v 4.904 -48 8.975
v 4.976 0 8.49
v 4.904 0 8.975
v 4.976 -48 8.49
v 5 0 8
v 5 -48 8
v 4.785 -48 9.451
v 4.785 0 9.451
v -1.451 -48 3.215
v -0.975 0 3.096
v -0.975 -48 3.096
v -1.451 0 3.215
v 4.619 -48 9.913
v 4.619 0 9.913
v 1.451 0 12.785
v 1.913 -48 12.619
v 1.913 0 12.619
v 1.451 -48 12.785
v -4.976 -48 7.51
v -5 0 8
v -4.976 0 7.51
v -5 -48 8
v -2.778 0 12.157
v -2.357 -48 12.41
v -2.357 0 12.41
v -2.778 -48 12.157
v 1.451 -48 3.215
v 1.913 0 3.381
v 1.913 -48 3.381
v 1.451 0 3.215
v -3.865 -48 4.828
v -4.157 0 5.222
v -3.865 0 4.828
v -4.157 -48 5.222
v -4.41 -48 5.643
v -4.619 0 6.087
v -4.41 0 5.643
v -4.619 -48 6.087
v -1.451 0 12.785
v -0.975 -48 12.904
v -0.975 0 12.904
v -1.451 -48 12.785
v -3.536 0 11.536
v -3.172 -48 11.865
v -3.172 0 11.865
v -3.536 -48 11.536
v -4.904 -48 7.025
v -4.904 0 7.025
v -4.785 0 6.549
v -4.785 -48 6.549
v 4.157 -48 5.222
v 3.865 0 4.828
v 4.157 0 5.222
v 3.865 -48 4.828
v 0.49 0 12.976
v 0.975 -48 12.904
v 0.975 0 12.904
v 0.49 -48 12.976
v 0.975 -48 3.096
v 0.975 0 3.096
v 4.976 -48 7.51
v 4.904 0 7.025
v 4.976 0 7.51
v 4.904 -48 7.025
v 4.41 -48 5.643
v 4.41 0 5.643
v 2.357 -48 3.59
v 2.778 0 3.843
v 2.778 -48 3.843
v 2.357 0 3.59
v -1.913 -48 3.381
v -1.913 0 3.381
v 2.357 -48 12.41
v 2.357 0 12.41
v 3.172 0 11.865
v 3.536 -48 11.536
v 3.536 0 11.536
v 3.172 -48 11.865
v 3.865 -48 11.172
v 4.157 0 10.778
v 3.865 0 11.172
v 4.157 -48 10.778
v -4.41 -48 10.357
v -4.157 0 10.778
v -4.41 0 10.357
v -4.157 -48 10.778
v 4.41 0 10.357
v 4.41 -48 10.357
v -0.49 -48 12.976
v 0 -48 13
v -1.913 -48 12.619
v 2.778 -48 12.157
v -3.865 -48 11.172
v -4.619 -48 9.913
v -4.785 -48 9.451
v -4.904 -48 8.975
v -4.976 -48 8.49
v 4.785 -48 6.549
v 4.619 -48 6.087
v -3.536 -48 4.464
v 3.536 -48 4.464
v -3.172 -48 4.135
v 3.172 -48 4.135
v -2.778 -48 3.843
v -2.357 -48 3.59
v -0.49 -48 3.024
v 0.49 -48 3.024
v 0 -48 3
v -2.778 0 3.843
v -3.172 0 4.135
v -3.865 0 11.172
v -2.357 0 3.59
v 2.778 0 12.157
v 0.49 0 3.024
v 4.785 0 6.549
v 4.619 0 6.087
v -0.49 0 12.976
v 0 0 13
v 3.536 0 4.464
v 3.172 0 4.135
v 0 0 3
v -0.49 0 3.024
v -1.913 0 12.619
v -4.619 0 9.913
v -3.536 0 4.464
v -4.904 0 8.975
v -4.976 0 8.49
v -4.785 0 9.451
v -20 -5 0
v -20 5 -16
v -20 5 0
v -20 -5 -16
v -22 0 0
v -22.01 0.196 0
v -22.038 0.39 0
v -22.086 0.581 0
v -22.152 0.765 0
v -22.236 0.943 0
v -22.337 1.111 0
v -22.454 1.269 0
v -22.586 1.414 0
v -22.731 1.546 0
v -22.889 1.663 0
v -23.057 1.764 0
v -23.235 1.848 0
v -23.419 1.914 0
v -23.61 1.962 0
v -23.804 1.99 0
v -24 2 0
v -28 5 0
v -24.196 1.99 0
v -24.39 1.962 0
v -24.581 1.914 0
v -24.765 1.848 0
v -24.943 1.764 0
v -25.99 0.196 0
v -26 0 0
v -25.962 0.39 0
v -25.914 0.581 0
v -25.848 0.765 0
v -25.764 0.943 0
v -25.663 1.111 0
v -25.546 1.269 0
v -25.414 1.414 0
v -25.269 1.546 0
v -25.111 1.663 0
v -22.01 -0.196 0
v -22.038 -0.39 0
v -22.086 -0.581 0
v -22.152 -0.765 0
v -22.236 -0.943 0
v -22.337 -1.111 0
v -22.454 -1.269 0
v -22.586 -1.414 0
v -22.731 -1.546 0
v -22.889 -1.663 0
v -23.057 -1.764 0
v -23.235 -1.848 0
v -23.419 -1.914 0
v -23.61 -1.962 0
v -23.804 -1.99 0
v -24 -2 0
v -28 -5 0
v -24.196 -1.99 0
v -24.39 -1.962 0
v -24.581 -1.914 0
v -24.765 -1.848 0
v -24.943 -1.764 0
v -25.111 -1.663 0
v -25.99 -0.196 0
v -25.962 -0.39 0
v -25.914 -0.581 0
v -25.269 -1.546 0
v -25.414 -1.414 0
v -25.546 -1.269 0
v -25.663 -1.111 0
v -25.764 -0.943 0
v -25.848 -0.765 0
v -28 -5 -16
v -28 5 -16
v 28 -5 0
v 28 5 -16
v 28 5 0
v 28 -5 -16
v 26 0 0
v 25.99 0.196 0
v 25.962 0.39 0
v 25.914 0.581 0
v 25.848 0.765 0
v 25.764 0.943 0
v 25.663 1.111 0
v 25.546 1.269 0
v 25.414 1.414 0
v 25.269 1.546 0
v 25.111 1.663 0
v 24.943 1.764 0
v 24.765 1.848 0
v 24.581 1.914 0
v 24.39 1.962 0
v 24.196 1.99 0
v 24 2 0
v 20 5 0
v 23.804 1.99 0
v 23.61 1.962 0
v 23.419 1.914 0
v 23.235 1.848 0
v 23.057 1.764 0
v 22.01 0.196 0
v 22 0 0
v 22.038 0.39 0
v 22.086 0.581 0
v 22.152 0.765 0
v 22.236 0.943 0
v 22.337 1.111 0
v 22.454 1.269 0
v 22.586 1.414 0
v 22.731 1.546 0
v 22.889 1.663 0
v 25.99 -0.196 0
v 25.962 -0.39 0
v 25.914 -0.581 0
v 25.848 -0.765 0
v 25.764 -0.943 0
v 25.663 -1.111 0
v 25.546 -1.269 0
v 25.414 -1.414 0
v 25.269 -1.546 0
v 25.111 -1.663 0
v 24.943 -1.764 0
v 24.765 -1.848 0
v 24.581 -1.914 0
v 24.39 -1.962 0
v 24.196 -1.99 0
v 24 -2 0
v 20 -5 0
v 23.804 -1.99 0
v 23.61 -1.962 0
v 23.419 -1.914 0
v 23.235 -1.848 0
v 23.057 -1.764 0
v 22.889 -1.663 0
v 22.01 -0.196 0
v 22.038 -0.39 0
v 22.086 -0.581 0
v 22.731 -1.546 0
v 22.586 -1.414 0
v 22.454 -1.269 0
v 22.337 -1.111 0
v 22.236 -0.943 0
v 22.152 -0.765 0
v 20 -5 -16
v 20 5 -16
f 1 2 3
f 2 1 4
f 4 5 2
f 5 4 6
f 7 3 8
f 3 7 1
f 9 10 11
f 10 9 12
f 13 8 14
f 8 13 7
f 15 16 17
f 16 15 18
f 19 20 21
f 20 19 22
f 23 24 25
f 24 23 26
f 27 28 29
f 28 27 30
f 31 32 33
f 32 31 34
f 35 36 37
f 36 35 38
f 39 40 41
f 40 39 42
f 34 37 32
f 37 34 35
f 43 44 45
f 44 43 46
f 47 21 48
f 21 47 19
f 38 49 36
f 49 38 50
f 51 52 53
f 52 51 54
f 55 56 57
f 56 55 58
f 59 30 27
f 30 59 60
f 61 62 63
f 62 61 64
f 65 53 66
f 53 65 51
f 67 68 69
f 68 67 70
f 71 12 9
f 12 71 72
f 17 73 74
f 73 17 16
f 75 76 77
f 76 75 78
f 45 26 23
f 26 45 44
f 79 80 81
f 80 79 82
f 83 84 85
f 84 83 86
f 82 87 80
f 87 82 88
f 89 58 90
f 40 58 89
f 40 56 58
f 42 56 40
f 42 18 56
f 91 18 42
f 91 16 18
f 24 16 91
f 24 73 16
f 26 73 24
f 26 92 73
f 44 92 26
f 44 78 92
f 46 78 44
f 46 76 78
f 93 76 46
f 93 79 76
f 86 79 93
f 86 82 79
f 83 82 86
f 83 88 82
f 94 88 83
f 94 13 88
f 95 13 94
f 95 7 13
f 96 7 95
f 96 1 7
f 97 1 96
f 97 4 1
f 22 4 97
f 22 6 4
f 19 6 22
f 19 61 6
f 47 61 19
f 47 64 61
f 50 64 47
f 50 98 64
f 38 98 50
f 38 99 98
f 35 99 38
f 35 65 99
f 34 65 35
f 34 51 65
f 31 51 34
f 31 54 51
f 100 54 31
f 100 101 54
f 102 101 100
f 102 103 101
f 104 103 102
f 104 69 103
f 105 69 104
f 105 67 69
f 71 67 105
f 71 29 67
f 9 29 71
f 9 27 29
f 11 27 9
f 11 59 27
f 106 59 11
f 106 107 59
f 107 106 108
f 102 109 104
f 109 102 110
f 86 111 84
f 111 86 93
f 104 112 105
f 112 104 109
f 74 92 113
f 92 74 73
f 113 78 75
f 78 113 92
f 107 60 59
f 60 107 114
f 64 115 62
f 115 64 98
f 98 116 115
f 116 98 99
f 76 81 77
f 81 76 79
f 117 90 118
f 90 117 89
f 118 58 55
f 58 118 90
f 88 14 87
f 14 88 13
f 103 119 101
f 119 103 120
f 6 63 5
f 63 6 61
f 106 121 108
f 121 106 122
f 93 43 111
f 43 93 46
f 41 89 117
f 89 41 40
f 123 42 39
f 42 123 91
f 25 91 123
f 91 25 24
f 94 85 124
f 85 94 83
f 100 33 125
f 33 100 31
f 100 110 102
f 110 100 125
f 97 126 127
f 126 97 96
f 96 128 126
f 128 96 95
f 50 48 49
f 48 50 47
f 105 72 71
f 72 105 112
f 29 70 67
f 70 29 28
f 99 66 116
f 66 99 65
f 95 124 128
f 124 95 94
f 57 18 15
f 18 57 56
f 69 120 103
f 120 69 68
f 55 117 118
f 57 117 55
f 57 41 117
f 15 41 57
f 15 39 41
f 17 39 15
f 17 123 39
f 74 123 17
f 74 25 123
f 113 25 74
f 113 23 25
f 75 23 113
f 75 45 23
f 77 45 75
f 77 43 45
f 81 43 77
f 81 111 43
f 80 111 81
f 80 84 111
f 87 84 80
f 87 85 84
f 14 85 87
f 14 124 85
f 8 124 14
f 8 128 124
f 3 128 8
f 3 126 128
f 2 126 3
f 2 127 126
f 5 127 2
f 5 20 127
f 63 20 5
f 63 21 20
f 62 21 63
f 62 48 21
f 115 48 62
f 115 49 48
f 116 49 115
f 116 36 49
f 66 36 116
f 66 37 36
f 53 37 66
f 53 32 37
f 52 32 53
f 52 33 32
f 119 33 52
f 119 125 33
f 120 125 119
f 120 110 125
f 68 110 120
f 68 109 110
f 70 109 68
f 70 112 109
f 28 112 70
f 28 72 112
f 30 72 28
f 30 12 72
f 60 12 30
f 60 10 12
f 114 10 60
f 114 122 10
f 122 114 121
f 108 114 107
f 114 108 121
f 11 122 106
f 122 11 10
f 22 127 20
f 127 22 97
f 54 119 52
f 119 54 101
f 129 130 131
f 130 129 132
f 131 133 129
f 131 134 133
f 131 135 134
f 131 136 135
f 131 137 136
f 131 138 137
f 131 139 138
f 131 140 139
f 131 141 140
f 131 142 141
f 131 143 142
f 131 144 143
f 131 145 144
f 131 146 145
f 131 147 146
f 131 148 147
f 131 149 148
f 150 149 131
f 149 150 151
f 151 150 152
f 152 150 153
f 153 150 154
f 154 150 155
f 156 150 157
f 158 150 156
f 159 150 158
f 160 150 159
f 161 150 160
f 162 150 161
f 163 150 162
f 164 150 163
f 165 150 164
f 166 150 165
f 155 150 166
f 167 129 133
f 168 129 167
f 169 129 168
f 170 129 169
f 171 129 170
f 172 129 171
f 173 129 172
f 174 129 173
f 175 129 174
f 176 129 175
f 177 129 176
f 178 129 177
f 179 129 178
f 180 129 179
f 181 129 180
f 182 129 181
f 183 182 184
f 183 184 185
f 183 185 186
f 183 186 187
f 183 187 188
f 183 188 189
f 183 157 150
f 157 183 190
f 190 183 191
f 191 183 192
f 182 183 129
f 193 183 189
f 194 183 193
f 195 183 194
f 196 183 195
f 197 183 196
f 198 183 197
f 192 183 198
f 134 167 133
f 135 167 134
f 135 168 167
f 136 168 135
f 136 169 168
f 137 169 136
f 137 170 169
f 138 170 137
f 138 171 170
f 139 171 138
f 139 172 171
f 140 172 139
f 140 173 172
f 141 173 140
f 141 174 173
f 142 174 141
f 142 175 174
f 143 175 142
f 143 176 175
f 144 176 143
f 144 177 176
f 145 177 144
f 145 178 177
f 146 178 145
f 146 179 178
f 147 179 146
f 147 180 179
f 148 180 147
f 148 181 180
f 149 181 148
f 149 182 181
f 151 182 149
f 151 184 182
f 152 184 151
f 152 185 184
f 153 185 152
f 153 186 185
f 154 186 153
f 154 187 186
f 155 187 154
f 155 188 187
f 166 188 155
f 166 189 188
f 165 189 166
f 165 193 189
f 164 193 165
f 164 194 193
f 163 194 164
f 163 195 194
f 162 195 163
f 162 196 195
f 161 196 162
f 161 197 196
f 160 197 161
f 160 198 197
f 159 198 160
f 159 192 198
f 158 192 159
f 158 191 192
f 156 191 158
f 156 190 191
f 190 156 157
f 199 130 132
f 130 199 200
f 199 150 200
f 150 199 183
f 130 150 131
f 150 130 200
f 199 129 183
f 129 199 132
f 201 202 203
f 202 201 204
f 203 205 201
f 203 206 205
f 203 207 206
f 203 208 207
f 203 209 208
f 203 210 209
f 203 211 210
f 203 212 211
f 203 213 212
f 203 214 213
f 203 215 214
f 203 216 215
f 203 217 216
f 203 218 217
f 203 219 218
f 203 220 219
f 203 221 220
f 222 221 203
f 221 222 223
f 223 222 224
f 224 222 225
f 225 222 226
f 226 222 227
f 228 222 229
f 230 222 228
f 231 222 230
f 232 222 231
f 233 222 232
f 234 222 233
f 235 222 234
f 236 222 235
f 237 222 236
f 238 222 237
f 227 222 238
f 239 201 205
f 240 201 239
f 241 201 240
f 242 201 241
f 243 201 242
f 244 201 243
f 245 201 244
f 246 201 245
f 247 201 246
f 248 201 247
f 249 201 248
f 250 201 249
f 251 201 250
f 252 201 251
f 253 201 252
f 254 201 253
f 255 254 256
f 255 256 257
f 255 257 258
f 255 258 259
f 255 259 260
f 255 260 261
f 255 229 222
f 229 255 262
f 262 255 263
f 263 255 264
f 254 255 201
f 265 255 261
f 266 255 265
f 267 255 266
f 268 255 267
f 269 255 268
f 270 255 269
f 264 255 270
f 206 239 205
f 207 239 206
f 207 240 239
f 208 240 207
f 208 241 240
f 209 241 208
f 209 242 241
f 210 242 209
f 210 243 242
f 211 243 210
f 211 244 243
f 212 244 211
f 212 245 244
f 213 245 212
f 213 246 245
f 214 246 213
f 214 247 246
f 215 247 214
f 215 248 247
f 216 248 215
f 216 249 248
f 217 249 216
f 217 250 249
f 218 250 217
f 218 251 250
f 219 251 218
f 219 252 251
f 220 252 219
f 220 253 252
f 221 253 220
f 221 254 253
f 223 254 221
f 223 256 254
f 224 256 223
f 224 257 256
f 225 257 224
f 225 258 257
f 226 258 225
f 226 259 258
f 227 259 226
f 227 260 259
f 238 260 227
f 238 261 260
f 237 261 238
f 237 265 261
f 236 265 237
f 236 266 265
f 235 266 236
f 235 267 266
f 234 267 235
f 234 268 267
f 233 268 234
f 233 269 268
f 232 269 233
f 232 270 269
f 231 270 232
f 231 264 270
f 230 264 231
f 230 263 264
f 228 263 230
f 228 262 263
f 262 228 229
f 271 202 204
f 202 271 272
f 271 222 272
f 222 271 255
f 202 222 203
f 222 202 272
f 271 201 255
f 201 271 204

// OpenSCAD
module u_shaped_mounting_strap() {
    difference() {
        union() {
            // Semicircular arched center section
            translate([0, 0, 8])
                rotate([90, 0, 0])
                cylinder(h=48, r=5, $fn=64);

            // Left end tab
            translate([-24, 0, -8])
                cube([8, 10, 16], center=true);

            // Right end tab
            translate([24, 0, -8])
                cube([8, 10, 16], center=true);
        }

        // Left hole
        translate([-24, 0, 0])
            cylinder(h=16, r=2, $fn=64);

        // Right hole
        translate([24, 0, 0])
            cylinder(h=16, r=2, $fn=64);
    }
}

u_shaped_mounting_strap();
